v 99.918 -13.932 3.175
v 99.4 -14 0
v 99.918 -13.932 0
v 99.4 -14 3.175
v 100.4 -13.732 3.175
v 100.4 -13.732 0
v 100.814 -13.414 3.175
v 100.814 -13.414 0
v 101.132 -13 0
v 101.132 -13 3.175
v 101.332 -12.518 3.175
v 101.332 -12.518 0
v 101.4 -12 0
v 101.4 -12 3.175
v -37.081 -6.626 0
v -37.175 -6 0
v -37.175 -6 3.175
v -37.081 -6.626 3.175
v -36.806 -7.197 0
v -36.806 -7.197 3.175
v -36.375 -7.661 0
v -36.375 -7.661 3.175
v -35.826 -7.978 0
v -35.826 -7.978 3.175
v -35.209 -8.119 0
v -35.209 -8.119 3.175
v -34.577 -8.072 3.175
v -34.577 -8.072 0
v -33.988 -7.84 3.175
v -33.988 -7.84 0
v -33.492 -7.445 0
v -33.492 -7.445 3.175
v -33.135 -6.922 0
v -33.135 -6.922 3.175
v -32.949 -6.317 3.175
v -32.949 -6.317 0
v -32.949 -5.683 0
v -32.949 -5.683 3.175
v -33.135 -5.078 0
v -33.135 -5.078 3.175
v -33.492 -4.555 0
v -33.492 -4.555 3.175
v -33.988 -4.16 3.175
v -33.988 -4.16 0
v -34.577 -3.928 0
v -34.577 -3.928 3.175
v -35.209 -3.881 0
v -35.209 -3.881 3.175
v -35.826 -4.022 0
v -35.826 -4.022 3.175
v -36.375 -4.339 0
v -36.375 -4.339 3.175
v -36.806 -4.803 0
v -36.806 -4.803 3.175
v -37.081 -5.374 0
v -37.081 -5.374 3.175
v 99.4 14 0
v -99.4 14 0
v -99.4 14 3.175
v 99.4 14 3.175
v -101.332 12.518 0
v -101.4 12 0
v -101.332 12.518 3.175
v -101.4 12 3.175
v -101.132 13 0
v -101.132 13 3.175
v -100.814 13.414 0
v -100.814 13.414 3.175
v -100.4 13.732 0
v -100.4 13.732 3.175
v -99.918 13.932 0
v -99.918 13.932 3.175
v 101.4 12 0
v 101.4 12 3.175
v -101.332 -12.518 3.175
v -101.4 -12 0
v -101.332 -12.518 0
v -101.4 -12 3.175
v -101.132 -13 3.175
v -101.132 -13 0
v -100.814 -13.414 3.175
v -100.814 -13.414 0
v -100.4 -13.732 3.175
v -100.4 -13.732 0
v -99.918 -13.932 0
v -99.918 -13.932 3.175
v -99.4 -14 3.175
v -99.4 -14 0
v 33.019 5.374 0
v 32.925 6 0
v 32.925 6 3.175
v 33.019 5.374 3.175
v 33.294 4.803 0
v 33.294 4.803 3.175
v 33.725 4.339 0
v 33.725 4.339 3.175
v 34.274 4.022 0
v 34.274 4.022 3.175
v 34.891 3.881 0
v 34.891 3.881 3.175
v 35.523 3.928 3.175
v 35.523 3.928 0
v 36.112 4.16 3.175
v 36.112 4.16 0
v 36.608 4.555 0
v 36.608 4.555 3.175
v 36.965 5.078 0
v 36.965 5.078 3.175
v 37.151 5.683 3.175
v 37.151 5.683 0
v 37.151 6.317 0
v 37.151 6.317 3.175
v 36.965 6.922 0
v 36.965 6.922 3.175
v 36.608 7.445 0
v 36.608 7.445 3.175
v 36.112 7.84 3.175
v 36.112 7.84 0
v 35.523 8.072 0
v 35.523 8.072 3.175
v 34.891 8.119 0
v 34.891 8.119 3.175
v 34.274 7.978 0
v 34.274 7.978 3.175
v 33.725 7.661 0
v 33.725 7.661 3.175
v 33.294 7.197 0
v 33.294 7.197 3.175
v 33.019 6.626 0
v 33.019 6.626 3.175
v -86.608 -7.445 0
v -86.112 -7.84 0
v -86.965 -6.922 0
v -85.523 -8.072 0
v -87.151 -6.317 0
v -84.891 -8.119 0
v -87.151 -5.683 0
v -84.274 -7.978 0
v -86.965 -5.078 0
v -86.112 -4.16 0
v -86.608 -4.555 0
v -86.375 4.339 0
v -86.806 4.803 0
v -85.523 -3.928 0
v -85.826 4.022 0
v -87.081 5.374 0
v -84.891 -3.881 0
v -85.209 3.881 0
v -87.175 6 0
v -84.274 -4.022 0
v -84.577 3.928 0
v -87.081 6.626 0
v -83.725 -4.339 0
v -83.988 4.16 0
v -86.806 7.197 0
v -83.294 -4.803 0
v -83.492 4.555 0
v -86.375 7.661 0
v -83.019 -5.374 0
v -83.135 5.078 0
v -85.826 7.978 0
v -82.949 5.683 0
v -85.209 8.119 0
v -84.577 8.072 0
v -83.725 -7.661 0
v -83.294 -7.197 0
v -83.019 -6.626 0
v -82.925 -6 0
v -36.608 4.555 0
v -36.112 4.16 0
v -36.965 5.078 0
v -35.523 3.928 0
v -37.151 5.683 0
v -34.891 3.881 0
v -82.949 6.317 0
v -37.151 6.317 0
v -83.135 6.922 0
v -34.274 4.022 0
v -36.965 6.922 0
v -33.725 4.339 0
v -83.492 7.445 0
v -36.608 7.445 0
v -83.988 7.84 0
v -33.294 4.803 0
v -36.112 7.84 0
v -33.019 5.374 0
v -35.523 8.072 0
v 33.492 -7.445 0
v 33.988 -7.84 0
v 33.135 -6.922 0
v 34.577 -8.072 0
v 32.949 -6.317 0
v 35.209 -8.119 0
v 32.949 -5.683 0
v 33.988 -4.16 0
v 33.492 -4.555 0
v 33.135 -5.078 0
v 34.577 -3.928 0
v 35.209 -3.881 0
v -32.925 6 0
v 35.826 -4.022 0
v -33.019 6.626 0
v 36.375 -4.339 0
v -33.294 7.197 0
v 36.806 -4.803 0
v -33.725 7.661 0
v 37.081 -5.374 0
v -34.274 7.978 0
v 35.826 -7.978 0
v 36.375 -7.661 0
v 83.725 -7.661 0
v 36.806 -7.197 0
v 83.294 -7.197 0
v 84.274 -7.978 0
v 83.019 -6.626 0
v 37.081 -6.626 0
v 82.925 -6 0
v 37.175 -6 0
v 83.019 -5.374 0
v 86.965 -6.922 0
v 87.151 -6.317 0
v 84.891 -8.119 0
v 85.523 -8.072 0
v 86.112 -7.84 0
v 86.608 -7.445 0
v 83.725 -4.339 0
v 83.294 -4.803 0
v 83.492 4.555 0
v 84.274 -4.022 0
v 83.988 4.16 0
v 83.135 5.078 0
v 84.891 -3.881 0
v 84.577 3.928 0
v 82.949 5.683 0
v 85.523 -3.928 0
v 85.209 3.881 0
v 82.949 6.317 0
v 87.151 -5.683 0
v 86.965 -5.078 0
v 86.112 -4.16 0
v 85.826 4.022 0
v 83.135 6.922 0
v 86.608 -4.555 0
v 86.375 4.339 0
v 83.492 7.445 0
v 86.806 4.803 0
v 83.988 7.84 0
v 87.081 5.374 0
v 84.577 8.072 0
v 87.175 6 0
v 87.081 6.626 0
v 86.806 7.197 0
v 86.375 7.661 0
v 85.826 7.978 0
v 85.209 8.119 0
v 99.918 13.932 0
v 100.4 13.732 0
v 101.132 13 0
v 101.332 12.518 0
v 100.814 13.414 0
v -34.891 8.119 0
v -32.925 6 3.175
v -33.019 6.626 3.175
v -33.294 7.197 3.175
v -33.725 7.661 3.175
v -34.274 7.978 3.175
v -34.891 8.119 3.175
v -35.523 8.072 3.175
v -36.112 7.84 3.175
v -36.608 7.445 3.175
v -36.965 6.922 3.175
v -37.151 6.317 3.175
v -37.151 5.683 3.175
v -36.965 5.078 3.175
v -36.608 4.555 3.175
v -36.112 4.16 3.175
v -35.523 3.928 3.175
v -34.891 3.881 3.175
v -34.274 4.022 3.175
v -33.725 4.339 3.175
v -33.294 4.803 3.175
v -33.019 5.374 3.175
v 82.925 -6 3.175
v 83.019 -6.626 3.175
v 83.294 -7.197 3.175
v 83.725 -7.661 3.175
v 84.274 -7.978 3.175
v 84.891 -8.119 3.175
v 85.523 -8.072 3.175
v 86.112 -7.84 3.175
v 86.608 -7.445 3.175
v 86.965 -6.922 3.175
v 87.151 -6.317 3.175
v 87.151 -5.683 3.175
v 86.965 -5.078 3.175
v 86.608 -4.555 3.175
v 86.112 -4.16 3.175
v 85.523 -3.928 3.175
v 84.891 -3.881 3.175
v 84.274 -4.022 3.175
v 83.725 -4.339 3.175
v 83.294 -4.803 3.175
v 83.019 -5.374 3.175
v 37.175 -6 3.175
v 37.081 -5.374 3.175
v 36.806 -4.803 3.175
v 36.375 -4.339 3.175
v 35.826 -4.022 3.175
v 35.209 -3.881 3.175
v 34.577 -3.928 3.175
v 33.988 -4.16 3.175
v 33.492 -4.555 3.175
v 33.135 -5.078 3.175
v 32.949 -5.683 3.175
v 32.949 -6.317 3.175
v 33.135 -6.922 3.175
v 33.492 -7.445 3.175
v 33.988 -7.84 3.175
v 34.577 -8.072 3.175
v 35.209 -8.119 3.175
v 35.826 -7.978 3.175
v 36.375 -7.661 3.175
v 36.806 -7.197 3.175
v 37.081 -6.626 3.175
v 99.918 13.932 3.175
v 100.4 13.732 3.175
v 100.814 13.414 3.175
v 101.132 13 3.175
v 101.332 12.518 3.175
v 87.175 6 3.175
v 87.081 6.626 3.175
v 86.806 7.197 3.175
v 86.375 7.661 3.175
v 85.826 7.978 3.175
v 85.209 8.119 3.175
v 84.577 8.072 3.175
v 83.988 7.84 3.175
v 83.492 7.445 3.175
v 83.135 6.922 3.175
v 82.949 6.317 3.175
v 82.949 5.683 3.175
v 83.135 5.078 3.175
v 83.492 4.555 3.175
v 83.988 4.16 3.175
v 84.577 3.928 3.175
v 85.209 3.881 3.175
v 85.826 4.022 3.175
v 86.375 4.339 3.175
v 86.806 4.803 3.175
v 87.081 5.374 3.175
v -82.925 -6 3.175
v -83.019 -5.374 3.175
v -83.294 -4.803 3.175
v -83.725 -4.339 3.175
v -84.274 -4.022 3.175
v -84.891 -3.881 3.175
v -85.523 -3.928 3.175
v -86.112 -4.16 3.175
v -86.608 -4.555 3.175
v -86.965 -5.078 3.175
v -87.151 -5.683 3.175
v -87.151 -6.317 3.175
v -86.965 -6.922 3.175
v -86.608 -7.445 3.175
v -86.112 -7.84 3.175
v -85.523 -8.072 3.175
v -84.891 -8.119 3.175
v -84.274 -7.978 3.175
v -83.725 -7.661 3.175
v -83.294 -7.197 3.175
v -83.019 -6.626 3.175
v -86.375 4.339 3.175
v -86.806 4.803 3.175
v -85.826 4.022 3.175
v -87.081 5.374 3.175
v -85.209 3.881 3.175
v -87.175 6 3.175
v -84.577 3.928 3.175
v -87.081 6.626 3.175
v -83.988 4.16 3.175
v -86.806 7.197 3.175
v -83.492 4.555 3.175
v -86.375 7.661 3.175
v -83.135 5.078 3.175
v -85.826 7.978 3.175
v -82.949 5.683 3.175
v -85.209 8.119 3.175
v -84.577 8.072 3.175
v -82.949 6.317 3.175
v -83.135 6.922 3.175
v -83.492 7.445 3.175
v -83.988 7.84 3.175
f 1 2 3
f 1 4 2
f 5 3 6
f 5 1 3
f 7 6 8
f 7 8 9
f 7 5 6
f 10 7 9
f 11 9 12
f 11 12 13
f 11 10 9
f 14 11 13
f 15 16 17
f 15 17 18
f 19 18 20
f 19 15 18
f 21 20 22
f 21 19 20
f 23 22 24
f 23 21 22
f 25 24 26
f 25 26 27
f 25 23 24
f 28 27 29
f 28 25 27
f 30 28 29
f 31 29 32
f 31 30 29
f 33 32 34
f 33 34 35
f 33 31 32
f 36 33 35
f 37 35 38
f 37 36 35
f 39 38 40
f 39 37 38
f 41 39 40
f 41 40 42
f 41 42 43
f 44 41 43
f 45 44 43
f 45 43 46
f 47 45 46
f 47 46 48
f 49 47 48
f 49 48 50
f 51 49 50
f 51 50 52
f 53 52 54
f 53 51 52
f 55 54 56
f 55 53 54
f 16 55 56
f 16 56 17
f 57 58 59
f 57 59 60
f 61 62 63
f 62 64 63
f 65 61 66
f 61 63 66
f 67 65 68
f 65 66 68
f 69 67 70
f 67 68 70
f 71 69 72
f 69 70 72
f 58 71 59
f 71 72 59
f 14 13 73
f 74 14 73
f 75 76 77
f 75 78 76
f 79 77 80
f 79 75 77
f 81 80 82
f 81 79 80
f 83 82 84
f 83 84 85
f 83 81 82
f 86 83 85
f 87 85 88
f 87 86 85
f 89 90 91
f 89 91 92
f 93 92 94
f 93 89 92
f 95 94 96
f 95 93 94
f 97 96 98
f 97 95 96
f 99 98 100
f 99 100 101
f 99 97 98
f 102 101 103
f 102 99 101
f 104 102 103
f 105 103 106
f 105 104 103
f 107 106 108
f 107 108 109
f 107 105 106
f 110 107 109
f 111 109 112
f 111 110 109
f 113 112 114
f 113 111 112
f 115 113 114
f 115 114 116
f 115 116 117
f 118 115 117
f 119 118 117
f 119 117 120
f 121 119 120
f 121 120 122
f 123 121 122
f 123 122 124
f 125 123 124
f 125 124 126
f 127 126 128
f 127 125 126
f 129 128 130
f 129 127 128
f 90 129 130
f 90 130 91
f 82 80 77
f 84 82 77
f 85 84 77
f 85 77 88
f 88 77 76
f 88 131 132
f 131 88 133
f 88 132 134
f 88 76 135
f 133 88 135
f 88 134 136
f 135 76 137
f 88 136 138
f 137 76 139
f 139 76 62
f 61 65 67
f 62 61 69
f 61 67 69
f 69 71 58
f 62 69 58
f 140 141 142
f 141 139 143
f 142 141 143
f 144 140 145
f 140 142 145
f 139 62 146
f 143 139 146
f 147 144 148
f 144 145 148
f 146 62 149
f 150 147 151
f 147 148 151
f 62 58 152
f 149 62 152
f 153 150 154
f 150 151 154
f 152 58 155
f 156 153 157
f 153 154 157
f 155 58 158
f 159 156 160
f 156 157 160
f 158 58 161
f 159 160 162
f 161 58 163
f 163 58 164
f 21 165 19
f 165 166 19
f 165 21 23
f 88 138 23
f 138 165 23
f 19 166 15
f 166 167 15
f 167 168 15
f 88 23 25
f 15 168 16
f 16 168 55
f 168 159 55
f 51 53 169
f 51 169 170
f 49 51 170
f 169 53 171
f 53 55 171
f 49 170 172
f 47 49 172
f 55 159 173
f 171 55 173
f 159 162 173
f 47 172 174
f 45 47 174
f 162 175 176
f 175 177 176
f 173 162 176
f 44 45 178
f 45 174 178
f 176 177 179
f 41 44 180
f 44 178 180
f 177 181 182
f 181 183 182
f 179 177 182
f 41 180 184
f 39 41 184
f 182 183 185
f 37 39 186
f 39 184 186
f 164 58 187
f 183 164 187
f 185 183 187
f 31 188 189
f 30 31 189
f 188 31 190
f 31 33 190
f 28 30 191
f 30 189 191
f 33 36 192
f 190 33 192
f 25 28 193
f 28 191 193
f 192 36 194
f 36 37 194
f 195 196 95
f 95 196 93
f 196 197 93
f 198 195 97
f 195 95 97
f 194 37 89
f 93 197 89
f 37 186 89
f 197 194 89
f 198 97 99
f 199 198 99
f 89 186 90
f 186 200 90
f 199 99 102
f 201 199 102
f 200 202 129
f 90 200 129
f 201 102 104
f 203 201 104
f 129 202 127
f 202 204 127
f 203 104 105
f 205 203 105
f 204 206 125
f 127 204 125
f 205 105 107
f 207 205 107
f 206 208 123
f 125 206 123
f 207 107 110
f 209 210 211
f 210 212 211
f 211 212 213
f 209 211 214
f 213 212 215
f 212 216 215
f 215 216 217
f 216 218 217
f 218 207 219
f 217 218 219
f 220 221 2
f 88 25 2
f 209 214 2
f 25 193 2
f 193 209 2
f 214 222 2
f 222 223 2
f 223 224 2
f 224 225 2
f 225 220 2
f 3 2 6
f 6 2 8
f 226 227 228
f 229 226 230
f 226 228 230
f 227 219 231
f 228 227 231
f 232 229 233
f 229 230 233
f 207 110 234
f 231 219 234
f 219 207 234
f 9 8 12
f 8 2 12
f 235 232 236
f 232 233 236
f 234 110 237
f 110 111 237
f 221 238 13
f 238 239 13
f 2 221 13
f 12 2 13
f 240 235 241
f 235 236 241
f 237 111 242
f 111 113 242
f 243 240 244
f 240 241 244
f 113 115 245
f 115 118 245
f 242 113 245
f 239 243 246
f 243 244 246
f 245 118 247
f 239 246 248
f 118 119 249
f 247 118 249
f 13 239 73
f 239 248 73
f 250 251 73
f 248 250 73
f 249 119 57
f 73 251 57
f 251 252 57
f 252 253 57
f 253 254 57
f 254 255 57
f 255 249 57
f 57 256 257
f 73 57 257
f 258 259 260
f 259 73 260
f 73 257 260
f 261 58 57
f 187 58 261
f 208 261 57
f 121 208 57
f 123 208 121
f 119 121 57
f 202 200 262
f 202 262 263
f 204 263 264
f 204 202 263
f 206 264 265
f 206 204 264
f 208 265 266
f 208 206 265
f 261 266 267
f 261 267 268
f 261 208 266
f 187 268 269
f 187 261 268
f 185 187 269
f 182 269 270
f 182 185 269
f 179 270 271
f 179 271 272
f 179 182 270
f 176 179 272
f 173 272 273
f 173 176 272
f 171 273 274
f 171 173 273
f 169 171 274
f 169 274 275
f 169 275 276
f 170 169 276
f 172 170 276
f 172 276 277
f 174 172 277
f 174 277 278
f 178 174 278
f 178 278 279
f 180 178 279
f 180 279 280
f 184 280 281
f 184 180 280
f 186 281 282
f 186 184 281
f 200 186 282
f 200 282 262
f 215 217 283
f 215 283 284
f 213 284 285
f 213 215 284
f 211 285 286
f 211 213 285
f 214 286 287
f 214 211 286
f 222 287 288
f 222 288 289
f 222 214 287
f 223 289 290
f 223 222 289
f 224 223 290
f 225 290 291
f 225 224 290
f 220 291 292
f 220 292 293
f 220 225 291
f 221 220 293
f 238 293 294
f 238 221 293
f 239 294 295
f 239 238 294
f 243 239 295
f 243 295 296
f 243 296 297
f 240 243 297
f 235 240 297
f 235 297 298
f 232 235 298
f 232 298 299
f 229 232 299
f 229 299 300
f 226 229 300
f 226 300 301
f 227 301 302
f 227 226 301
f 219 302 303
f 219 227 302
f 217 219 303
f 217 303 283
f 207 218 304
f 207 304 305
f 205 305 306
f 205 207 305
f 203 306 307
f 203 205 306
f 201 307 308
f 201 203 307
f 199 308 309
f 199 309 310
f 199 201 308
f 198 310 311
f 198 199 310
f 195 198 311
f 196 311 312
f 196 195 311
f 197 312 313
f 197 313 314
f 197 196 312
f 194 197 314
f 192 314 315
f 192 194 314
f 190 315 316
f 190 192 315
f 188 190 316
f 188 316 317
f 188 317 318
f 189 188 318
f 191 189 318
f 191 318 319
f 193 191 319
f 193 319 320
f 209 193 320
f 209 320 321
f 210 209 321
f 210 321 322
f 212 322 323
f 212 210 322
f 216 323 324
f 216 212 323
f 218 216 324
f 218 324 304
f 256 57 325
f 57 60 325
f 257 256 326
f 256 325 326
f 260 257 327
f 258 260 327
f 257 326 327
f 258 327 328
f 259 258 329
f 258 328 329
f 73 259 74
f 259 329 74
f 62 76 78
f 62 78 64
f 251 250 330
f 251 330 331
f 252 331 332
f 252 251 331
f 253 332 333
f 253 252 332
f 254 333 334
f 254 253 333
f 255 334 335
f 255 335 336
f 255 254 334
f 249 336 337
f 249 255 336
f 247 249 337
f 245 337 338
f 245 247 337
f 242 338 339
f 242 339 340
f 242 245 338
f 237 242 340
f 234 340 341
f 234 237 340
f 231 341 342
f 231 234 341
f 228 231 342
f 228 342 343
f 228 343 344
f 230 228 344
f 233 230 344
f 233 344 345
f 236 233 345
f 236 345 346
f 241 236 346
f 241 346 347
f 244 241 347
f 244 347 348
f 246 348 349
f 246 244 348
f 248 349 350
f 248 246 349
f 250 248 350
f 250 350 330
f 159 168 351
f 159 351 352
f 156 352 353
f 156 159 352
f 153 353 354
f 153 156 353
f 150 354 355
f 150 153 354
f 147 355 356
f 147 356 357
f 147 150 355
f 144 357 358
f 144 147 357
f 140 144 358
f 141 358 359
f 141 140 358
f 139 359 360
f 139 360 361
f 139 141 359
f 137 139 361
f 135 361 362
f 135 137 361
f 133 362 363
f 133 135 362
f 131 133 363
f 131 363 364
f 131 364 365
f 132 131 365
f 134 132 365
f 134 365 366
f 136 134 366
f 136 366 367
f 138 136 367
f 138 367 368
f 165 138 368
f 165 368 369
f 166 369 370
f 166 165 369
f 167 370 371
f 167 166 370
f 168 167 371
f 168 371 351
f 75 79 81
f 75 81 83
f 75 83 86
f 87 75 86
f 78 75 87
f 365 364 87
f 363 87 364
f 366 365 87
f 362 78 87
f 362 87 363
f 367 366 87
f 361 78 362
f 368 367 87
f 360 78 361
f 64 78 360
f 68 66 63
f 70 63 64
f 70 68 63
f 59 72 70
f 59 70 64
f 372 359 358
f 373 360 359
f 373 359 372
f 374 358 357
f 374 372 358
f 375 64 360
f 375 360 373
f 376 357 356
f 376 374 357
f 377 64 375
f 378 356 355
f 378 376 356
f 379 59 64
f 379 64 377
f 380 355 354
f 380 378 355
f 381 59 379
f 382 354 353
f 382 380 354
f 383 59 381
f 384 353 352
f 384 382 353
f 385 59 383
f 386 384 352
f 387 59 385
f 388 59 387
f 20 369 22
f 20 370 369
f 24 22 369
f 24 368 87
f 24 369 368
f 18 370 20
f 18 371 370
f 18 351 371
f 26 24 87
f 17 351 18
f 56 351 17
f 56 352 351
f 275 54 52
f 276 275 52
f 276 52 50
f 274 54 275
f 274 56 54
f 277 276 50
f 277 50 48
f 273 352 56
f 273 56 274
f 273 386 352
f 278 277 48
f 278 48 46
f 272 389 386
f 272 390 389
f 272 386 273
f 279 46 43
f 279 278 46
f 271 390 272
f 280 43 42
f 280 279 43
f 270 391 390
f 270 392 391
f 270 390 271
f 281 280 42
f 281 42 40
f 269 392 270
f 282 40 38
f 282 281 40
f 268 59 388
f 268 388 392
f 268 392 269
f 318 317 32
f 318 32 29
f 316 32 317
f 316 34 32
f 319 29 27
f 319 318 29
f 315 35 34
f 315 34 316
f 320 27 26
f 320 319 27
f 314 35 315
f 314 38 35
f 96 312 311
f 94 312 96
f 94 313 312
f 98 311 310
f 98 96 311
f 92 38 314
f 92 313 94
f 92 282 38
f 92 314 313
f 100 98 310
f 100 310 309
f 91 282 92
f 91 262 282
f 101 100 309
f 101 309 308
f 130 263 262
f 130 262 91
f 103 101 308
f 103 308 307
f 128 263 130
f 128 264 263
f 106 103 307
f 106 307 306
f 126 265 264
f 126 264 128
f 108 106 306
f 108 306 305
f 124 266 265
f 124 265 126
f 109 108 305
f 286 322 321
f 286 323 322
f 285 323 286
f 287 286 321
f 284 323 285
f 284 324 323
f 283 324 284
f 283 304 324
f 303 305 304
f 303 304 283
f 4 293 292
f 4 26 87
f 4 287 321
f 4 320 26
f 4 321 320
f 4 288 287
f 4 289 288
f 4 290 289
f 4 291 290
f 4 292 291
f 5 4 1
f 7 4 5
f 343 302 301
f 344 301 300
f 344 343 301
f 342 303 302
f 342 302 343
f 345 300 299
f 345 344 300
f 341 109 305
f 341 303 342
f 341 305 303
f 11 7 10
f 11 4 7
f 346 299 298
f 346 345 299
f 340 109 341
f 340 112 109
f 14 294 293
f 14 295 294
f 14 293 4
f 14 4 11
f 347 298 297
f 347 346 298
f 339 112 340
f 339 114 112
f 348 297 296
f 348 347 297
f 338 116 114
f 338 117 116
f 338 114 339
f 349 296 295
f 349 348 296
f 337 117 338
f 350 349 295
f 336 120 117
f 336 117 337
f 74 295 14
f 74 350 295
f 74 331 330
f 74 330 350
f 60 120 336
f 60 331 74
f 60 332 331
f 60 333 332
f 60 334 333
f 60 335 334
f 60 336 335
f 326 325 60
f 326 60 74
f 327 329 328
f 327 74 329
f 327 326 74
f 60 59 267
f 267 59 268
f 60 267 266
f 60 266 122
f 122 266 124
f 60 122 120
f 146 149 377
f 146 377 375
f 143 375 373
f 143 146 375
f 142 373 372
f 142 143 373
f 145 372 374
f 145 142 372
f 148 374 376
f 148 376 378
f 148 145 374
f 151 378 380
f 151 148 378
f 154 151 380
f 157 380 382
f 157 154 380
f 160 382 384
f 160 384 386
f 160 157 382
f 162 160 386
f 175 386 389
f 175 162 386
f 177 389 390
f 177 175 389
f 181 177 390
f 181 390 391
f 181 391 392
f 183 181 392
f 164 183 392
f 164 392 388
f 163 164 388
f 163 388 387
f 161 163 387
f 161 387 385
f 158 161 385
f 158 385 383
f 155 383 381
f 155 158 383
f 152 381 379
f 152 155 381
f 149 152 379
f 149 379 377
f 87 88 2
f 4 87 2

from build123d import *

# Parameters (mm, degrees)
SKETCH1_W           = 202.8
SKETCH1_H           = 28
SKETCH1_R           = 2.125
BOSS_EXTRUDE1_DEPTH = 3.175
FILLET1_R           = 2


with BuildPart() as part:
    # Sketch1 → Boss-Extrude1 (new body)
    with BuildSketch(Plane.XY):
        Rectangle(SKETCH1_W, SKETCH1_H)
        with Locations((85.05, 6)):
            Circle(SKETCH1_R, mode=Mode.SUBTRACT)
        with Locations(Location((85.05, -6, 0), (0, 0, 180))):
            Circle(SKETCH1_R, mode=Mode.SUBTRACT)
        with Locations((-85.05, -6)):
            Circle(SKETCH1_R, mode=Mode.SUBTRACT)
        with Locations(Location((-85.05, 6, 0), (0, 0, 180))):
            Circle(SKETCH1_R, mode=Mode.SUBTRACT)
        with Locations((-35.05, 6)):
            Circle(SKETCH1_R, mode=Mode.SUBTRACT)
        with Locations(Location((-35.05, -6, 0), (0, 0, 180))):
            Circle(SKETCH1_R, mode=Mode.SUBTRACT)
        with Locations((35.05, -6)):
            Circle(SKETCH1_R, mode=Mode.SUBTRACT)
        with Locations(Location((35.05, 6, 0), (0, 0, 180))):
            Circle(SKETCH1_R, mode=Mode.SUBTRACT)
    extrude(amount=BOSS_EXTRUDE1_DEPTH)

    # Fillet1
    fillet1_edges = [part.edges().sort_by_distance(p)[0] for p in [
        (101.4, -14, 1.5875),
        (-101.4, -14, 1.5875),
        (-101.4, 14, 1.5875),
        (101.4, 14, 1.5875),
    ]]
    fillet(fillet1_edges, radius=FILLET1_R)


solid = part.part
